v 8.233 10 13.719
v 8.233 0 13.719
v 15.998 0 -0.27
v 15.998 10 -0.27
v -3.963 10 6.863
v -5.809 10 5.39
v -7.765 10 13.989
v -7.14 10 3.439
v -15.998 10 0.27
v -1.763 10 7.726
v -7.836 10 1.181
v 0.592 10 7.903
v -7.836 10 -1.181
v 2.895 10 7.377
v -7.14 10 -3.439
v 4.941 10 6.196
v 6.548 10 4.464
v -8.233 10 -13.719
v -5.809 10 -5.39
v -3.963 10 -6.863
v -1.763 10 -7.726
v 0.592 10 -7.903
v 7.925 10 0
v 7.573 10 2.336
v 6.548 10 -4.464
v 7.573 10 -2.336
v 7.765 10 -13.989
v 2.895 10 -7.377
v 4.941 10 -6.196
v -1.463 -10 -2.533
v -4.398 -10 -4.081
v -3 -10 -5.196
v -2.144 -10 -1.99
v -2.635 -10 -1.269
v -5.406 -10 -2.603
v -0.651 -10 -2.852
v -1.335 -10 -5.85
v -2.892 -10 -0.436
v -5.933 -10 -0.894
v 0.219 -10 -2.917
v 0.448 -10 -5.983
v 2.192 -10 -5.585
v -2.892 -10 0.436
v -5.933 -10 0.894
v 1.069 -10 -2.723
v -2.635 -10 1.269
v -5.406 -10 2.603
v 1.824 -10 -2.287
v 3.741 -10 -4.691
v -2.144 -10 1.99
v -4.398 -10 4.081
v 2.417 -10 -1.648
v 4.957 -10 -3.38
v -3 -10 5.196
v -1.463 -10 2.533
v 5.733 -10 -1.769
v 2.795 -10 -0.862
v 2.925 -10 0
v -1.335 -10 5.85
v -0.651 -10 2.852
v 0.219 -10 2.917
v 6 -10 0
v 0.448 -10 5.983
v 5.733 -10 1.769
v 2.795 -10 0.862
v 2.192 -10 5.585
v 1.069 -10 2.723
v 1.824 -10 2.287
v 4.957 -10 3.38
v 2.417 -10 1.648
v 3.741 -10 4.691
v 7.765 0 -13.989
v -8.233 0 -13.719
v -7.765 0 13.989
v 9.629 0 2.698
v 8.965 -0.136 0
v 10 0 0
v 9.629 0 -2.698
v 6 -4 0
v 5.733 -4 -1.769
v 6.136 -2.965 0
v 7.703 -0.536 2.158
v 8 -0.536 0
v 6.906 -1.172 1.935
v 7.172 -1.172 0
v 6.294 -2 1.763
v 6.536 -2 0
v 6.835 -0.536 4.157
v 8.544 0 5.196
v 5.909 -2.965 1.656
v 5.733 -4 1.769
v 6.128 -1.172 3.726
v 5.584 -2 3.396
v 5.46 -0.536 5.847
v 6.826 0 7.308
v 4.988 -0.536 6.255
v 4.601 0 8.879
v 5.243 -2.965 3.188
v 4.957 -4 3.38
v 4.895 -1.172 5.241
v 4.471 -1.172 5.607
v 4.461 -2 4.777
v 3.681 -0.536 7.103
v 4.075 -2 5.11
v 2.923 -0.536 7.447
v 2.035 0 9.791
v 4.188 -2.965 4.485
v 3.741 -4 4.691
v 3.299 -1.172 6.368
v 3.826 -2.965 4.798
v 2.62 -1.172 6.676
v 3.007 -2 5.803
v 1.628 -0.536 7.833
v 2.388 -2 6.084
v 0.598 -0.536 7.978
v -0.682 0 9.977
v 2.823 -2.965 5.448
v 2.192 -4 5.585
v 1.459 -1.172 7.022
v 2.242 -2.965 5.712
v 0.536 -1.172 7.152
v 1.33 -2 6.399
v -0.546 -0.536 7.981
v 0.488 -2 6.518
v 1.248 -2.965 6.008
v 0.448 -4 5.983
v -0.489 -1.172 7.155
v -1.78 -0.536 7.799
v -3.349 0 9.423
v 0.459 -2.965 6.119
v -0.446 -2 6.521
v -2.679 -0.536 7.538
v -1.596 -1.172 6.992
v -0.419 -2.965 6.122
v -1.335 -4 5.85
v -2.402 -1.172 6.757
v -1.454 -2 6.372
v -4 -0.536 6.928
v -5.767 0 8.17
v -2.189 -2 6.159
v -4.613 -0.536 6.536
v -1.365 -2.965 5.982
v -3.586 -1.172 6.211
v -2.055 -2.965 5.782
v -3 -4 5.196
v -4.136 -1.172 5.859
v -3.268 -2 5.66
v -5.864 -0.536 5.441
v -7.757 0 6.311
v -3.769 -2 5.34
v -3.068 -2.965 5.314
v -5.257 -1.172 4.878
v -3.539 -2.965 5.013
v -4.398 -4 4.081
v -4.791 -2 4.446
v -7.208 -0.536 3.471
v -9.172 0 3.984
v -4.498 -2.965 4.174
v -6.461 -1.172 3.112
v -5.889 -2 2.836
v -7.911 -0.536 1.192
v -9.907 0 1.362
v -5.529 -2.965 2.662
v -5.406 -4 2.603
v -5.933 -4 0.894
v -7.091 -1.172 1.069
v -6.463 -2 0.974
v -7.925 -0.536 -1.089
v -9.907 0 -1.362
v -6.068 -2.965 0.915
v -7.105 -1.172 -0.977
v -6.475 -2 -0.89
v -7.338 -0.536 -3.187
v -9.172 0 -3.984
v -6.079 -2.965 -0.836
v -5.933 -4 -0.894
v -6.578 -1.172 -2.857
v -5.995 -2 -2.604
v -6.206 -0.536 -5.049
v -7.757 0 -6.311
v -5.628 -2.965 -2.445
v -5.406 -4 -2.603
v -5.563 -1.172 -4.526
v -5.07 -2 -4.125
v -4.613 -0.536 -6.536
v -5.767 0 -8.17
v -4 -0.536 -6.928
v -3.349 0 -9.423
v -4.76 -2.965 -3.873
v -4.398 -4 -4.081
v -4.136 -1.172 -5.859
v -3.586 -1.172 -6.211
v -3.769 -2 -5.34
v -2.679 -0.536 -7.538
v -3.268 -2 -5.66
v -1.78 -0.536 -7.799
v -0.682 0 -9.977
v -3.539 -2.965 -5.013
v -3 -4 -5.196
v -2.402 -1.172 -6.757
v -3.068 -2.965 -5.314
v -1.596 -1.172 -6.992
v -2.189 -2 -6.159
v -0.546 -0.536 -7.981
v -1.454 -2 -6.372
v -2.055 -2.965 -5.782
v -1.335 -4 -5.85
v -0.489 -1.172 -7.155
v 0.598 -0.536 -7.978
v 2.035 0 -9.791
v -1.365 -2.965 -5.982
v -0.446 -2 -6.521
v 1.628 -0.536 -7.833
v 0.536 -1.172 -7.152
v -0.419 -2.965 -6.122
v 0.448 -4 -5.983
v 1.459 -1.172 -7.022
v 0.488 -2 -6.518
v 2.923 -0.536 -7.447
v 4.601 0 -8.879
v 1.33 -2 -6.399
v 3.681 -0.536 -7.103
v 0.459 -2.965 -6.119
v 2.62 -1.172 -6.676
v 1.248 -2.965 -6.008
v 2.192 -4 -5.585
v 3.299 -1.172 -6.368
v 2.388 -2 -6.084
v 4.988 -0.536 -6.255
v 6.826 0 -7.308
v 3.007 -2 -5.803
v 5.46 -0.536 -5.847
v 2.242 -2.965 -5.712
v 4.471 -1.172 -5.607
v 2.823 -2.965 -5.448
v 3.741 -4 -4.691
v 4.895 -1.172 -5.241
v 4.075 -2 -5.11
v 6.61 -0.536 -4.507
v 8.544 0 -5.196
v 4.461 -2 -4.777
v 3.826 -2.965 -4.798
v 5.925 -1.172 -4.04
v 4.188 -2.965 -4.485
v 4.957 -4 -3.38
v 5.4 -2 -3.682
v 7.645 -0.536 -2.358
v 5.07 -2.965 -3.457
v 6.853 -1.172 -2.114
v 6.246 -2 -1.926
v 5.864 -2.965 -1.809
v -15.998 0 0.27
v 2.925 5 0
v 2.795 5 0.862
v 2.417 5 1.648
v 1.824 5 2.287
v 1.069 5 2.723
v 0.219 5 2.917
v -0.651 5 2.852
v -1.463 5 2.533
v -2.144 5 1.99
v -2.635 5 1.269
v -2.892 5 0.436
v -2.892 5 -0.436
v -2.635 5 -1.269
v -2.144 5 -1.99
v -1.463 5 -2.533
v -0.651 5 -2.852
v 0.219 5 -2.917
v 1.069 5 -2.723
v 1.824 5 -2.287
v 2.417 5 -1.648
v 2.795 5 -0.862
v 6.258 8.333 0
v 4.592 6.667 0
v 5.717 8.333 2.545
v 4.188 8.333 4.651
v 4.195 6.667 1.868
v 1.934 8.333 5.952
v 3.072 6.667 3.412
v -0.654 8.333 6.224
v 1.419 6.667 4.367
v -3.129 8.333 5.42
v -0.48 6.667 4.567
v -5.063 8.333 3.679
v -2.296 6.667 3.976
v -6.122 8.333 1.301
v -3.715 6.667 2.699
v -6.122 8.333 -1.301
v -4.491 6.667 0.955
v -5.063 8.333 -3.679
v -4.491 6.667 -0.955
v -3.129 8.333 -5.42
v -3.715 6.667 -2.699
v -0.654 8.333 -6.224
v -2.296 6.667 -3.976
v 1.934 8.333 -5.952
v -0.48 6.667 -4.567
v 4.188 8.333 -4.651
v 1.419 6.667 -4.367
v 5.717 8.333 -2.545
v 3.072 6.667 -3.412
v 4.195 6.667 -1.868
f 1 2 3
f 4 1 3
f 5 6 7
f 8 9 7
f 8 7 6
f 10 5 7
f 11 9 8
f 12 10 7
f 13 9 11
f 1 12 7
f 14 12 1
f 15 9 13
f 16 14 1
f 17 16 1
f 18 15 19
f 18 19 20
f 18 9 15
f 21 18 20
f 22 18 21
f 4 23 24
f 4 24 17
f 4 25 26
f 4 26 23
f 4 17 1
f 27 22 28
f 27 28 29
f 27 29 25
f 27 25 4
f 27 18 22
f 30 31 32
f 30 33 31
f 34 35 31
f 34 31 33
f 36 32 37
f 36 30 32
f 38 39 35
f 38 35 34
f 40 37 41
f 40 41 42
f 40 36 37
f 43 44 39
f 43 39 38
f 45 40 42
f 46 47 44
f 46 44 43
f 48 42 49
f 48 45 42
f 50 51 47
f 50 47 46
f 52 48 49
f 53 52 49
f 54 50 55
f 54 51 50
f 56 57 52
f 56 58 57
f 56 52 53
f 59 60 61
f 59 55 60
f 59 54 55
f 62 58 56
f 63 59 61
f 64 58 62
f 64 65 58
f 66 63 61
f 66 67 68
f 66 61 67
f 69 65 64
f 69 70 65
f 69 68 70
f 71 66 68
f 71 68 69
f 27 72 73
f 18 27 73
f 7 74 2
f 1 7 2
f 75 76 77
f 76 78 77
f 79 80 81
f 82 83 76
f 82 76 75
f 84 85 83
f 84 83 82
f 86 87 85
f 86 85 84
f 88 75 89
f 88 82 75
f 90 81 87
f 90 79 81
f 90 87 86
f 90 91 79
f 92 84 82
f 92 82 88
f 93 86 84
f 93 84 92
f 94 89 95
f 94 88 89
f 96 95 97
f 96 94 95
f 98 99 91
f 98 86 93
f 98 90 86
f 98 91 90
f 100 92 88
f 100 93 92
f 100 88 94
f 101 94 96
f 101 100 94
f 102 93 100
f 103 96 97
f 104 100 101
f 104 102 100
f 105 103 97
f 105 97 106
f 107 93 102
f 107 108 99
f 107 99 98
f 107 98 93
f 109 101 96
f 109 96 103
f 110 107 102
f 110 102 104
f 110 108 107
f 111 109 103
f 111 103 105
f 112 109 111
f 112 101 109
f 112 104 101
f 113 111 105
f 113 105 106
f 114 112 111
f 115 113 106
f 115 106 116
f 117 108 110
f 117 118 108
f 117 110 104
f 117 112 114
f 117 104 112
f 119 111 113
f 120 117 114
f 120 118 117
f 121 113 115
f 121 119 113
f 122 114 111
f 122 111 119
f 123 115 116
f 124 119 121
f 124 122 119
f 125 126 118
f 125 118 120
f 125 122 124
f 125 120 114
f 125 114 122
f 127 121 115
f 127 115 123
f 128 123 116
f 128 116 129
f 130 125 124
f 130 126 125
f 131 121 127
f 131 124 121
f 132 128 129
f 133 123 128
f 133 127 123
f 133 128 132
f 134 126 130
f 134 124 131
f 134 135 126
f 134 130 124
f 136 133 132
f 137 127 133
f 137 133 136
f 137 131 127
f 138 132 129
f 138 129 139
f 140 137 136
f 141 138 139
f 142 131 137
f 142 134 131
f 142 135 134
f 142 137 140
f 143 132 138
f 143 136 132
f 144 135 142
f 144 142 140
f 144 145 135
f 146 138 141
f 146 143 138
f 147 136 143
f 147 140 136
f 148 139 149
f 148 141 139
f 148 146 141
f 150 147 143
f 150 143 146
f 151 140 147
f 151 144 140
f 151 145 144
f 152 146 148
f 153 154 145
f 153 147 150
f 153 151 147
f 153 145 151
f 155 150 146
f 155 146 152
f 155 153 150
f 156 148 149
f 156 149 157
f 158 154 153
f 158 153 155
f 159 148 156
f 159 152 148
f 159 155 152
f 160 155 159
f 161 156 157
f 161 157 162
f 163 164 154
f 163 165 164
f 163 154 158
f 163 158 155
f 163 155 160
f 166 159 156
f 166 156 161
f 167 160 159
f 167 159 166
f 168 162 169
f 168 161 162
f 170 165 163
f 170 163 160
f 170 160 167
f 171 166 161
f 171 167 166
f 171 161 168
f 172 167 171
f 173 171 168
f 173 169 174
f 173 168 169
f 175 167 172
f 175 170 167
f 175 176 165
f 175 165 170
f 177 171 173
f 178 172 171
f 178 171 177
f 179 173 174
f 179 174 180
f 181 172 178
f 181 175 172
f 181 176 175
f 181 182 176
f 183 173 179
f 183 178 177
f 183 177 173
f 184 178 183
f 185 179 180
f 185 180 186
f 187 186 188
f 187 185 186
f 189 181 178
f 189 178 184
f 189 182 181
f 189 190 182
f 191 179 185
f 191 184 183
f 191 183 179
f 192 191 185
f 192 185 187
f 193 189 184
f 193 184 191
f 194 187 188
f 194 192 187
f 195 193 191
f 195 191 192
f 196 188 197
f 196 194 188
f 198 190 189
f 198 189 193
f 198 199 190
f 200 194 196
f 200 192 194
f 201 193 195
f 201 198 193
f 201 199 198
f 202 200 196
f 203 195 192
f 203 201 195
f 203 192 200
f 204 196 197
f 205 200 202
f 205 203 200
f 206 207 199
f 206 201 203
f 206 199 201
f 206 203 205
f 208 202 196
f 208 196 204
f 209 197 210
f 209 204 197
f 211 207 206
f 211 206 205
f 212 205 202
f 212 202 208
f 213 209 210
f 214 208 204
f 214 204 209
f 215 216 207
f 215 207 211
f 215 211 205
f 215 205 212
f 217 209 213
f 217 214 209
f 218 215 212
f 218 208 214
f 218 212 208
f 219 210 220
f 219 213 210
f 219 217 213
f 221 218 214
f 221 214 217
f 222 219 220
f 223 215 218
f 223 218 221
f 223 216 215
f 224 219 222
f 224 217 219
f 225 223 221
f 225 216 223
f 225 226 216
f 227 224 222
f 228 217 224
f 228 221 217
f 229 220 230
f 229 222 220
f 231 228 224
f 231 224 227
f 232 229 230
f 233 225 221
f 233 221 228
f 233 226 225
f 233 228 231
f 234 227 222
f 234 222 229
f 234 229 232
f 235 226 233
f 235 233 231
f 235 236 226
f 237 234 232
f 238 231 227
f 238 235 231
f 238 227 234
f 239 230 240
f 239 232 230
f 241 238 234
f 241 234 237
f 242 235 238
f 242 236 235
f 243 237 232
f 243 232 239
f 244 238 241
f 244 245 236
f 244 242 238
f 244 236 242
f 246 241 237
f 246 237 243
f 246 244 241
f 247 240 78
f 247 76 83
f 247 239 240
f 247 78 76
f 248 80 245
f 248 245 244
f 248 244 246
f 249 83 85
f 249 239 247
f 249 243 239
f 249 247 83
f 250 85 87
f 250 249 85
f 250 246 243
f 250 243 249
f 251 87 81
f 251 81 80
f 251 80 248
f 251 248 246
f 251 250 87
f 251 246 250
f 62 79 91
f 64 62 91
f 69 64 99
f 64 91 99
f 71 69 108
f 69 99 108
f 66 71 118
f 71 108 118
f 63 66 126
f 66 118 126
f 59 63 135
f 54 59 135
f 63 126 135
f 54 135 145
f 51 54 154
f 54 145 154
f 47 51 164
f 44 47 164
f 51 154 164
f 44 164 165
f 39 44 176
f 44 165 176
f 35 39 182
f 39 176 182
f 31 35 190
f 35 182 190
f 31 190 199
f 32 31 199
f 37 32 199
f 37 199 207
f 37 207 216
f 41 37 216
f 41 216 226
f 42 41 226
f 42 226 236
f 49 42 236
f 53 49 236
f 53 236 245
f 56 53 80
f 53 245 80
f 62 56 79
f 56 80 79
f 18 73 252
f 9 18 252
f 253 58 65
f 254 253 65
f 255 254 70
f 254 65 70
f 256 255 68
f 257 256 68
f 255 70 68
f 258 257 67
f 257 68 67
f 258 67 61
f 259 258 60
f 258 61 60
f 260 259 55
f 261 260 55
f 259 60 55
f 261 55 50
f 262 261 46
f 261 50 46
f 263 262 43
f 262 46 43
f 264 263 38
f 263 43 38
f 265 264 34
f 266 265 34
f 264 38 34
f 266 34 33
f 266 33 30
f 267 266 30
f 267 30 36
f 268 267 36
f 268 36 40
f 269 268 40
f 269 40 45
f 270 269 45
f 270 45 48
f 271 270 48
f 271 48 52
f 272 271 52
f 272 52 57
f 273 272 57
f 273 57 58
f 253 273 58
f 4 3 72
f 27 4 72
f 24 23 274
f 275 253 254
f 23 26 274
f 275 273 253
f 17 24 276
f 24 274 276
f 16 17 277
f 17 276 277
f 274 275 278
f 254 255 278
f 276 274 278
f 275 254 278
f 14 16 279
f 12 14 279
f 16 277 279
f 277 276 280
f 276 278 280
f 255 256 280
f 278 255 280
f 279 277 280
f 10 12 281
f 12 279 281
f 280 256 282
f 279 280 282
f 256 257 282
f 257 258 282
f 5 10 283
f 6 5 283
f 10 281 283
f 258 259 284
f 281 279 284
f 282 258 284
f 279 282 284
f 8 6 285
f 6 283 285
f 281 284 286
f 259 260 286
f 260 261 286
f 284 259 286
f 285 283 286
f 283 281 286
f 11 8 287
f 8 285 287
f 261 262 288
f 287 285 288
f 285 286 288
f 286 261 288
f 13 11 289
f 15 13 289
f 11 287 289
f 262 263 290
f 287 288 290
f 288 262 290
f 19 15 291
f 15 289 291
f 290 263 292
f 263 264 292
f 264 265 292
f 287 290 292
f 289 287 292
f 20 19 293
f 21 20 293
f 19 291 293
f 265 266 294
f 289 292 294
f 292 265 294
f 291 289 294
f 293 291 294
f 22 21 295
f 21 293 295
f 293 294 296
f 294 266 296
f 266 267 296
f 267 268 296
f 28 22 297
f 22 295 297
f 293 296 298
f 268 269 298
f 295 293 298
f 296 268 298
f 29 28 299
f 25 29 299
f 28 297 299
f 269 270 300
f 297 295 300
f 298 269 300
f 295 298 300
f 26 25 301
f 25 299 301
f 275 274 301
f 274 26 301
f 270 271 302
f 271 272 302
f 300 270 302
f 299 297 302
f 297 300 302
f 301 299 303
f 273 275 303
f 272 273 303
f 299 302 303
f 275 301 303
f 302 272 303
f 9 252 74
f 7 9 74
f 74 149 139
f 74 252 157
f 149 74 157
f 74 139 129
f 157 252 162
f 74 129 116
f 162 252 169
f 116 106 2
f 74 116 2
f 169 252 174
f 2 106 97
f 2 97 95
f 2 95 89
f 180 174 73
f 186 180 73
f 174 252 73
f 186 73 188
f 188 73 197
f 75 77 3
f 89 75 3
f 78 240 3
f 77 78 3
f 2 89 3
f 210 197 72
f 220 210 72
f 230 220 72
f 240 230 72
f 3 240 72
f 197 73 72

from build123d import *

# Parameters (mm, degrees)
BOSS_EXTRUDE1_DEPTH = 10
SKETCH2_R           = 6
BOSS_EXTRUDE2_DEPTH = 10
SKETCH3_R           = 2.925
CUT_EXTRUDE1_DEPTH  = 21
FILLET1_R           = 4
CHAMFER1_SIZE       = 5


with BuildPart() as part:
    # Sketch1 → Boss-Extrude1 (new body)
    with BuildSketch(Plane(origin=(0, 0, 0), x_dir=(1, 0, 0), z_dir=(0, 1, 0))):
        Polygon((7.764943234, 13.989483785), (-8.232776727, 13.719379992), (-15.997719961, -0.270103793), (-7.764943234, -13.989483785), (8.232776727, -13.719379992), (15.997719961, 0.270103793), align=None)
    extrude(amount=BOSS_EXTRUDE1_DEPTH)

    # Sketch2 → Boss-Extrude2 (add)
    with BuildSketch(Plane.XZ):
        Circle(SKETCH2_R)
    extrude(amount=BOSS_EXTRUDE2_DEPTH)

    # Sketch3 → Cut-Extrude1 (cut, through all)
    with BuildSketch(Plane.XZ.offset(10)):
        Circle(SKETCH3_R)
    extrude(amount=-CUT_EXTRUDE1_DEPTH, mode=Mode.SUBTRACT)

    # Fillet1
    fillet1_edges = [part.edges().sort_by_distance(p)[0] for p in [
        (-6, 0, 0),
    ]]
    fillet(fillet1_edges, radius=FILLET1_R)

    # Chamfer1
    chamfer1_edges = [part.edges().sort_by_distance(p)[0] for p in [
        (-2.925, 10, 0),
    ]]
    chamfer(chamfer1_edges, length=CHAMFER1_SIZE)


solid = part.part
